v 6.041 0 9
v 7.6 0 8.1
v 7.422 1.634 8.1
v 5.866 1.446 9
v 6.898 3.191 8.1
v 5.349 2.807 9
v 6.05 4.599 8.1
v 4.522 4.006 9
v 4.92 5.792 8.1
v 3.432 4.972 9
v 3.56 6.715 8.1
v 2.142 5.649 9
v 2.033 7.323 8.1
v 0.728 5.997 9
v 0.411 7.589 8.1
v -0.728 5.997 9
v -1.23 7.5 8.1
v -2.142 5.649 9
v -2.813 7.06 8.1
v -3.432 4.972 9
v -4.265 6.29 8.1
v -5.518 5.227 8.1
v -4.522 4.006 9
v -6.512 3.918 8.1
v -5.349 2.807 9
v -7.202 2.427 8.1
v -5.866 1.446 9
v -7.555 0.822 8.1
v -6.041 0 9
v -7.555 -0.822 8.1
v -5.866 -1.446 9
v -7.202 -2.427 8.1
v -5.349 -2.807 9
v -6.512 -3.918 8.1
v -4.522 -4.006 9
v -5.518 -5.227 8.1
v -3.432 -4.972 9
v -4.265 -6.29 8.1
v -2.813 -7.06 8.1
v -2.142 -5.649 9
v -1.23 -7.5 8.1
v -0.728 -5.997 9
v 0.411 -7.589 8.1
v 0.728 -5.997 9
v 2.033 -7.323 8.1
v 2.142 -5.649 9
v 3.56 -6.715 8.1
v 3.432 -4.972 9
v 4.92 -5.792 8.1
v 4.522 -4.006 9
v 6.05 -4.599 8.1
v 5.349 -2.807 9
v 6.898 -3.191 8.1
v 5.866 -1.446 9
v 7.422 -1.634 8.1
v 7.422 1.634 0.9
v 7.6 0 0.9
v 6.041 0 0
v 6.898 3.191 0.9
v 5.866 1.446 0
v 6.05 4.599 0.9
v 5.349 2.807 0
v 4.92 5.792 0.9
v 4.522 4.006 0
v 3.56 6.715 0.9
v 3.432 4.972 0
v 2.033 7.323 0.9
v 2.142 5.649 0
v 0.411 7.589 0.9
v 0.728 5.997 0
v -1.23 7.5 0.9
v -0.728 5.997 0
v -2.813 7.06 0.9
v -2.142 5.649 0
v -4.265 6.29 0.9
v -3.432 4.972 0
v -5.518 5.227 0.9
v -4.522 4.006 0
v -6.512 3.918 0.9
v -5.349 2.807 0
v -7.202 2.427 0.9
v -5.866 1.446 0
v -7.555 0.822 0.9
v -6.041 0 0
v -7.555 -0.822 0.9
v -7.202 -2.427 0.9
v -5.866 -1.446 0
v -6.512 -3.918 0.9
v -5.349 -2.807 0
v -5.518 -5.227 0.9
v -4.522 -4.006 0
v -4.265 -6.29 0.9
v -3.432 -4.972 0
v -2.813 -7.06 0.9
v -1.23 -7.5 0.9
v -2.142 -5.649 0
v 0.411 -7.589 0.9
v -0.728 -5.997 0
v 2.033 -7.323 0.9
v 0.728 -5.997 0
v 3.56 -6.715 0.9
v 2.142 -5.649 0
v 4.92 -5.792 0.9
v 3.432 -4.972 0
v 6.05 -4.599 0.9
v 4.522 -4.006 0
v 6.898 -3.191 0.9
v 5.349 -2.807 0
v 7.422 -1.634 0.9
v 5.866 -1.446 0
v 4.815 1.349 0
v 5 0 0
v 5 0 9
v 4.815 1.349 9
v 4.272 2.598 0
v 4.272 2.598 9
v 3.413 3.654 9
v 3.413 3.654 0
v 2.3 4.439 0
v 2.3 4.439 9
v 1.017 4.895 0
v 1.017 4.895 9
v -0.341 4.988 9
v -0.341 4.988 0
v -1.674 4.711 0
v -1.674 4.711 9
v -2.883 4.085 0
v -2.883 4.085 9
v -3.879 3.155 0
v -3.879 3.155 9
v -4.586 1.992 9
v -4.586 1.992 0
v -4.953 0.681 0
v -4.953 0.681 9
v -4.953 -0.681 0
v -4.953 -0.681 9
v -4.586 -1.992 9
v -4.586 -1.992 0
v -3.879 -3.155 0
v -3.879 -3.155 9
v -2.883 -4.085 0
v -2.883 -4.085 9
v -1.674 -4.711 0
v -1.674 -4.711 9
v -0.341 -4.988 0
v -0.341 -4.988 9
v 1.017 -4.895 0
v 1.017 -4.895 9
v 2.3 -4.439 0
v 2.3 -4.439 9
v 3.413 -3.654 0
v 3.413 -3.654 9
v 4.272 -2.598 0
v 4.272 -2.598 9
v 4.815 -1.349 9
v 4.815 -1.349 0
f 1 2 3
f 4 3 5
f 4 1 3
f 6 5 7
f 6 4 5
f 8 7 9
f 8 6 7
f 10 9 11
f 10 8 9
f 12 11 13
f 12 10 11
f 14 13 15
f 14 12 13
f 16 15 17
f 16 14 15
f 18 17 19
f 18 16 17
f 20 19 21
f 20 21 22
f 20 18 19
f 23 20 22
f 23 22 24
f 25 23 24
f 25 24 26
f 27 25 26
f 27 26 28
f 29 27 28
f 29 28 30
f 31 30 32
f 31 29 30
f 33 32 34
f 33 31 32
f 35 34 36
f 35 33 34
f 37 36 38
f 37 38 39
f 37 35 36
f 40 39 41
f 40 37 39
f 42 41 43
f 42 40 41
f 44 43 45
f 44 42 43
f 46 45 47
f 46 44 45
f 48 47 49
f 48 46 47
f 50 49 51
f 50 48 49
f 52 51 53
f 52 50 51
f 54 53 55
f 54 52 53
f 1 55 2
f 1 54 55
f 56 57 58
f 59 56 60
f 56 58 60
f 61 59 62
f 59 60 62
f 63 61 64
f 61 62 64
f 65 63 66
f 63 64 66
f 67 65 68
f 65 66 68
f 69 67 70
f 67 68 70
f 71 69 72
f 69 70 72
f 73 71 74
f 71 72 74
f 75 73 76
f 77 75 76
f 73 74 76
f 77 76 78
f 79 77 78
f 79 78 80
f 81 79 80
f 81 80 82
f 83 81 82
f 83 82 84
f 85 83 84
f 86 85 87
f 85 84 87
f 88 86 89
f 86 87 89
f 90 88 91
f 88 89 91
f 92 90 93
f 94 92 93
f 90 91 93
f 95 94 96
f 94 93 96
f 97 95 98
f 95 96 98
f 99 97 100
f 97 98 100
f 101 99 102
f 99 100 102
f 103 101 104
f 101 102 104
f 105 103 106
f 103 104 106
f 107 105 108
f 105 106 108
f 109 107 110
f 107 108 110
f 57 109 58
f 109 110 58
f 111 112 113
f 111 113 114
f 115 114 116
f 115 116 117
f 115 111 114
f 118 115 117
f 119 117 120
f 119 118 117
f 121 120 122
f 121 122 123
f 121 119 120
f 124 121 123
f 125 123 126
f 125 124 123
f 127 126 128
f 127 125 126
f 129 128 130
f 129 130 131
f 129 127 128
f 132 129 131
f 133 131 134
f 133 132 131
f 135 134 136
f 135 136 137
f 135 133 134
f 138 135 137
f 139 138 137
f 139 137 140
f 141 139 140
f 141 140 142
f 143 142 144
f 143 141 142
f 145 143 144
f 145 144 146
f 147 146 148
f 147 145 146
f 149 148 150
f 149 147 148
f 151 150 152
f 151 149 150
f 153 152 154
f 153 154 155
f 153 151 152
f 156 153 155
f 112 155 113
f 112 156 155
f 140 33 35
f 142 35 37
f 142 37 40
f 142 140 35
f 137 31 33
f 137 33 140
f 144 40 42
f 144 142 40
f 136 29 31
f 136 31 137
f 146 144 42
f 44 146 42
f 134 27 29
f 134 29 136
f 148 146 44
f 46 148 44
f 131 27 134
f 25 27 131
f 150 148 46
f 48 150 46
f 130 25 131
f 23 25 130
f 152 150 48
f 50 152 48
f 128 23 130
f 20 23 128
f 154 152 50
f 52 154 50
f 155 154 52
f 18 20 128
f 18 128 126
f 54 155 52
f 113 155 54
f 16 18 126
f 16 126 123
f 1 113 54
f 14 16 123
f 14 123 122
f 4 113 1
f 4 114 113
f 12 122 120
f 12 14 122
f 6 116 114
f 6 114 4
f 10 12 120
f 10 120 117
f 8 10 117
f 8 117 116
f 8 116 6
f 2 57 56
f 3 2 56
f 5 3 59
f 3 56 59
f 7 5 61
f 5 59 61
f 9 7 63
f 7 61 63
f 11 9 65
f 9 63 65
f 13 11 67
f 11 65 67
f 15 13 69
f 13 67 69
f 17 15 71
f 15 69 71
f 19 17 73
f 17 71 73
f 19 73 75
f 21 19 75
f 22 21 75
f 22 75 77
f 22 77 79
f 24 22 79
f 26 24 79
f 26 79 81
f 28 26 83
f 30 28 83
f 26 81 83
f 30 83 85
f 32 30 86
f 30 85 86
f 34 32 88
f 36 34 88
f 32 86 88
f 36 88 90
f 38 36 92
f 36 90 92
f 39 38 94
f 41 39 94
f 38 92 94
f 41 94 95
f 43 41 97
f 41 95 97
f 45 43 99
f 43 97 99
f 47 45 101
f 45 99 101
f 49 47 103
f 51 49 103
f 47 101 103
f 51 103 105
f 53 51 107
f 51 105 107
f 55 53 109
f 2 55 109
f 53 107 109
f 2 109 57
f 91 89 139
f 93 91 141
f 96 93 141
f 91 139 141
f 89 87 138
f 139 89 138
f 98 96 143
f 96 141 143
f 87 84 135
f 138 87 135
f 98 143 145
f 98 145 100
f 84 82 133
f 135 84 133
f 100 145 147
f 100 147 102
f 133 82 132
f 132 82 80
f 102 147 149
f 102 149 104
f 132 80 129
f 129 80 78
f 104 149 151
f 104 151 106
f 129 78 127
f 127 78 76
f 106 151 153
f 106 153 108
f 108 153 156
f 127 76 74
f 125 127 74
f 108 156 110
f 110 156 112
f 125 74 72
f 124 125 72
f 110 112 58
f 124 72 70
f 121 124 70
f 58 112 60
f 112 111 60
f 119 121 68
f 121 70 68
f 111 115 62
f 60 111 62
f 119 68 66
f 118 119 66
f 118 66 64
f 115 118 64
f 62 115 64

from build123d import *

# Parameters (mm, degrees)
ESQUISSE1_R        = 7.6
ESQUISSE1_R_2      = 5
BOSS_EXTRU_1_DEPTH = 9
CHANFREIN5_SIZE    = 0.9
CHANFREIN5_SIZE2   = 1.558845727
CHANFREIN9_SIZE    = 0.9
CHANFREIN9_SIZE2   = 1.558845727


with BuildPart() as part:
    # Esquisse1 → Boss.-Extru.1 (new body)
    with BuildSketch(Plane.XY):
        Circle(ESQUISSE1_R)
        Circle(ESQUISSE1_R_2, mode=Mode.SUBTRACT)
    extrude(amount=BOSS_EXTRU_1_DEPTH)

    # Chanfrein5
    chanfrein5_edges = [part.edges().sort_by_distance(p)[0] for p in [
        (-7.6, 0, 9),
    ]]
    chanfrein5_side = [part.faces().sort_by_distance(p)[0] for p in [
        (-7.6, 0, 4.5),
    ]]
    chamfer(chanfrein5_edges, length=CHANFREIN5_SIZE, length2=CHANFREIN5_SIZE2, reference=chanfrein5_side[0])

    # Chanfrein9
    chanfrein9_edges = [part.edges().sort_by_distance(p)[0] for p in [
        (-7.6, 0, 0),
    ]]
    chanfrein9_side = [part.faces().sort_by_distance(p)[0] for p in [
        (-7.6, 0, 4.05),
    ]]
    chamfer(chanfrein9_edges, length=CHANFREIN9_SIZE, length2=CHANFREIN9_SIZE2, reference=chanfrein9_side[0])


solid = part.part
